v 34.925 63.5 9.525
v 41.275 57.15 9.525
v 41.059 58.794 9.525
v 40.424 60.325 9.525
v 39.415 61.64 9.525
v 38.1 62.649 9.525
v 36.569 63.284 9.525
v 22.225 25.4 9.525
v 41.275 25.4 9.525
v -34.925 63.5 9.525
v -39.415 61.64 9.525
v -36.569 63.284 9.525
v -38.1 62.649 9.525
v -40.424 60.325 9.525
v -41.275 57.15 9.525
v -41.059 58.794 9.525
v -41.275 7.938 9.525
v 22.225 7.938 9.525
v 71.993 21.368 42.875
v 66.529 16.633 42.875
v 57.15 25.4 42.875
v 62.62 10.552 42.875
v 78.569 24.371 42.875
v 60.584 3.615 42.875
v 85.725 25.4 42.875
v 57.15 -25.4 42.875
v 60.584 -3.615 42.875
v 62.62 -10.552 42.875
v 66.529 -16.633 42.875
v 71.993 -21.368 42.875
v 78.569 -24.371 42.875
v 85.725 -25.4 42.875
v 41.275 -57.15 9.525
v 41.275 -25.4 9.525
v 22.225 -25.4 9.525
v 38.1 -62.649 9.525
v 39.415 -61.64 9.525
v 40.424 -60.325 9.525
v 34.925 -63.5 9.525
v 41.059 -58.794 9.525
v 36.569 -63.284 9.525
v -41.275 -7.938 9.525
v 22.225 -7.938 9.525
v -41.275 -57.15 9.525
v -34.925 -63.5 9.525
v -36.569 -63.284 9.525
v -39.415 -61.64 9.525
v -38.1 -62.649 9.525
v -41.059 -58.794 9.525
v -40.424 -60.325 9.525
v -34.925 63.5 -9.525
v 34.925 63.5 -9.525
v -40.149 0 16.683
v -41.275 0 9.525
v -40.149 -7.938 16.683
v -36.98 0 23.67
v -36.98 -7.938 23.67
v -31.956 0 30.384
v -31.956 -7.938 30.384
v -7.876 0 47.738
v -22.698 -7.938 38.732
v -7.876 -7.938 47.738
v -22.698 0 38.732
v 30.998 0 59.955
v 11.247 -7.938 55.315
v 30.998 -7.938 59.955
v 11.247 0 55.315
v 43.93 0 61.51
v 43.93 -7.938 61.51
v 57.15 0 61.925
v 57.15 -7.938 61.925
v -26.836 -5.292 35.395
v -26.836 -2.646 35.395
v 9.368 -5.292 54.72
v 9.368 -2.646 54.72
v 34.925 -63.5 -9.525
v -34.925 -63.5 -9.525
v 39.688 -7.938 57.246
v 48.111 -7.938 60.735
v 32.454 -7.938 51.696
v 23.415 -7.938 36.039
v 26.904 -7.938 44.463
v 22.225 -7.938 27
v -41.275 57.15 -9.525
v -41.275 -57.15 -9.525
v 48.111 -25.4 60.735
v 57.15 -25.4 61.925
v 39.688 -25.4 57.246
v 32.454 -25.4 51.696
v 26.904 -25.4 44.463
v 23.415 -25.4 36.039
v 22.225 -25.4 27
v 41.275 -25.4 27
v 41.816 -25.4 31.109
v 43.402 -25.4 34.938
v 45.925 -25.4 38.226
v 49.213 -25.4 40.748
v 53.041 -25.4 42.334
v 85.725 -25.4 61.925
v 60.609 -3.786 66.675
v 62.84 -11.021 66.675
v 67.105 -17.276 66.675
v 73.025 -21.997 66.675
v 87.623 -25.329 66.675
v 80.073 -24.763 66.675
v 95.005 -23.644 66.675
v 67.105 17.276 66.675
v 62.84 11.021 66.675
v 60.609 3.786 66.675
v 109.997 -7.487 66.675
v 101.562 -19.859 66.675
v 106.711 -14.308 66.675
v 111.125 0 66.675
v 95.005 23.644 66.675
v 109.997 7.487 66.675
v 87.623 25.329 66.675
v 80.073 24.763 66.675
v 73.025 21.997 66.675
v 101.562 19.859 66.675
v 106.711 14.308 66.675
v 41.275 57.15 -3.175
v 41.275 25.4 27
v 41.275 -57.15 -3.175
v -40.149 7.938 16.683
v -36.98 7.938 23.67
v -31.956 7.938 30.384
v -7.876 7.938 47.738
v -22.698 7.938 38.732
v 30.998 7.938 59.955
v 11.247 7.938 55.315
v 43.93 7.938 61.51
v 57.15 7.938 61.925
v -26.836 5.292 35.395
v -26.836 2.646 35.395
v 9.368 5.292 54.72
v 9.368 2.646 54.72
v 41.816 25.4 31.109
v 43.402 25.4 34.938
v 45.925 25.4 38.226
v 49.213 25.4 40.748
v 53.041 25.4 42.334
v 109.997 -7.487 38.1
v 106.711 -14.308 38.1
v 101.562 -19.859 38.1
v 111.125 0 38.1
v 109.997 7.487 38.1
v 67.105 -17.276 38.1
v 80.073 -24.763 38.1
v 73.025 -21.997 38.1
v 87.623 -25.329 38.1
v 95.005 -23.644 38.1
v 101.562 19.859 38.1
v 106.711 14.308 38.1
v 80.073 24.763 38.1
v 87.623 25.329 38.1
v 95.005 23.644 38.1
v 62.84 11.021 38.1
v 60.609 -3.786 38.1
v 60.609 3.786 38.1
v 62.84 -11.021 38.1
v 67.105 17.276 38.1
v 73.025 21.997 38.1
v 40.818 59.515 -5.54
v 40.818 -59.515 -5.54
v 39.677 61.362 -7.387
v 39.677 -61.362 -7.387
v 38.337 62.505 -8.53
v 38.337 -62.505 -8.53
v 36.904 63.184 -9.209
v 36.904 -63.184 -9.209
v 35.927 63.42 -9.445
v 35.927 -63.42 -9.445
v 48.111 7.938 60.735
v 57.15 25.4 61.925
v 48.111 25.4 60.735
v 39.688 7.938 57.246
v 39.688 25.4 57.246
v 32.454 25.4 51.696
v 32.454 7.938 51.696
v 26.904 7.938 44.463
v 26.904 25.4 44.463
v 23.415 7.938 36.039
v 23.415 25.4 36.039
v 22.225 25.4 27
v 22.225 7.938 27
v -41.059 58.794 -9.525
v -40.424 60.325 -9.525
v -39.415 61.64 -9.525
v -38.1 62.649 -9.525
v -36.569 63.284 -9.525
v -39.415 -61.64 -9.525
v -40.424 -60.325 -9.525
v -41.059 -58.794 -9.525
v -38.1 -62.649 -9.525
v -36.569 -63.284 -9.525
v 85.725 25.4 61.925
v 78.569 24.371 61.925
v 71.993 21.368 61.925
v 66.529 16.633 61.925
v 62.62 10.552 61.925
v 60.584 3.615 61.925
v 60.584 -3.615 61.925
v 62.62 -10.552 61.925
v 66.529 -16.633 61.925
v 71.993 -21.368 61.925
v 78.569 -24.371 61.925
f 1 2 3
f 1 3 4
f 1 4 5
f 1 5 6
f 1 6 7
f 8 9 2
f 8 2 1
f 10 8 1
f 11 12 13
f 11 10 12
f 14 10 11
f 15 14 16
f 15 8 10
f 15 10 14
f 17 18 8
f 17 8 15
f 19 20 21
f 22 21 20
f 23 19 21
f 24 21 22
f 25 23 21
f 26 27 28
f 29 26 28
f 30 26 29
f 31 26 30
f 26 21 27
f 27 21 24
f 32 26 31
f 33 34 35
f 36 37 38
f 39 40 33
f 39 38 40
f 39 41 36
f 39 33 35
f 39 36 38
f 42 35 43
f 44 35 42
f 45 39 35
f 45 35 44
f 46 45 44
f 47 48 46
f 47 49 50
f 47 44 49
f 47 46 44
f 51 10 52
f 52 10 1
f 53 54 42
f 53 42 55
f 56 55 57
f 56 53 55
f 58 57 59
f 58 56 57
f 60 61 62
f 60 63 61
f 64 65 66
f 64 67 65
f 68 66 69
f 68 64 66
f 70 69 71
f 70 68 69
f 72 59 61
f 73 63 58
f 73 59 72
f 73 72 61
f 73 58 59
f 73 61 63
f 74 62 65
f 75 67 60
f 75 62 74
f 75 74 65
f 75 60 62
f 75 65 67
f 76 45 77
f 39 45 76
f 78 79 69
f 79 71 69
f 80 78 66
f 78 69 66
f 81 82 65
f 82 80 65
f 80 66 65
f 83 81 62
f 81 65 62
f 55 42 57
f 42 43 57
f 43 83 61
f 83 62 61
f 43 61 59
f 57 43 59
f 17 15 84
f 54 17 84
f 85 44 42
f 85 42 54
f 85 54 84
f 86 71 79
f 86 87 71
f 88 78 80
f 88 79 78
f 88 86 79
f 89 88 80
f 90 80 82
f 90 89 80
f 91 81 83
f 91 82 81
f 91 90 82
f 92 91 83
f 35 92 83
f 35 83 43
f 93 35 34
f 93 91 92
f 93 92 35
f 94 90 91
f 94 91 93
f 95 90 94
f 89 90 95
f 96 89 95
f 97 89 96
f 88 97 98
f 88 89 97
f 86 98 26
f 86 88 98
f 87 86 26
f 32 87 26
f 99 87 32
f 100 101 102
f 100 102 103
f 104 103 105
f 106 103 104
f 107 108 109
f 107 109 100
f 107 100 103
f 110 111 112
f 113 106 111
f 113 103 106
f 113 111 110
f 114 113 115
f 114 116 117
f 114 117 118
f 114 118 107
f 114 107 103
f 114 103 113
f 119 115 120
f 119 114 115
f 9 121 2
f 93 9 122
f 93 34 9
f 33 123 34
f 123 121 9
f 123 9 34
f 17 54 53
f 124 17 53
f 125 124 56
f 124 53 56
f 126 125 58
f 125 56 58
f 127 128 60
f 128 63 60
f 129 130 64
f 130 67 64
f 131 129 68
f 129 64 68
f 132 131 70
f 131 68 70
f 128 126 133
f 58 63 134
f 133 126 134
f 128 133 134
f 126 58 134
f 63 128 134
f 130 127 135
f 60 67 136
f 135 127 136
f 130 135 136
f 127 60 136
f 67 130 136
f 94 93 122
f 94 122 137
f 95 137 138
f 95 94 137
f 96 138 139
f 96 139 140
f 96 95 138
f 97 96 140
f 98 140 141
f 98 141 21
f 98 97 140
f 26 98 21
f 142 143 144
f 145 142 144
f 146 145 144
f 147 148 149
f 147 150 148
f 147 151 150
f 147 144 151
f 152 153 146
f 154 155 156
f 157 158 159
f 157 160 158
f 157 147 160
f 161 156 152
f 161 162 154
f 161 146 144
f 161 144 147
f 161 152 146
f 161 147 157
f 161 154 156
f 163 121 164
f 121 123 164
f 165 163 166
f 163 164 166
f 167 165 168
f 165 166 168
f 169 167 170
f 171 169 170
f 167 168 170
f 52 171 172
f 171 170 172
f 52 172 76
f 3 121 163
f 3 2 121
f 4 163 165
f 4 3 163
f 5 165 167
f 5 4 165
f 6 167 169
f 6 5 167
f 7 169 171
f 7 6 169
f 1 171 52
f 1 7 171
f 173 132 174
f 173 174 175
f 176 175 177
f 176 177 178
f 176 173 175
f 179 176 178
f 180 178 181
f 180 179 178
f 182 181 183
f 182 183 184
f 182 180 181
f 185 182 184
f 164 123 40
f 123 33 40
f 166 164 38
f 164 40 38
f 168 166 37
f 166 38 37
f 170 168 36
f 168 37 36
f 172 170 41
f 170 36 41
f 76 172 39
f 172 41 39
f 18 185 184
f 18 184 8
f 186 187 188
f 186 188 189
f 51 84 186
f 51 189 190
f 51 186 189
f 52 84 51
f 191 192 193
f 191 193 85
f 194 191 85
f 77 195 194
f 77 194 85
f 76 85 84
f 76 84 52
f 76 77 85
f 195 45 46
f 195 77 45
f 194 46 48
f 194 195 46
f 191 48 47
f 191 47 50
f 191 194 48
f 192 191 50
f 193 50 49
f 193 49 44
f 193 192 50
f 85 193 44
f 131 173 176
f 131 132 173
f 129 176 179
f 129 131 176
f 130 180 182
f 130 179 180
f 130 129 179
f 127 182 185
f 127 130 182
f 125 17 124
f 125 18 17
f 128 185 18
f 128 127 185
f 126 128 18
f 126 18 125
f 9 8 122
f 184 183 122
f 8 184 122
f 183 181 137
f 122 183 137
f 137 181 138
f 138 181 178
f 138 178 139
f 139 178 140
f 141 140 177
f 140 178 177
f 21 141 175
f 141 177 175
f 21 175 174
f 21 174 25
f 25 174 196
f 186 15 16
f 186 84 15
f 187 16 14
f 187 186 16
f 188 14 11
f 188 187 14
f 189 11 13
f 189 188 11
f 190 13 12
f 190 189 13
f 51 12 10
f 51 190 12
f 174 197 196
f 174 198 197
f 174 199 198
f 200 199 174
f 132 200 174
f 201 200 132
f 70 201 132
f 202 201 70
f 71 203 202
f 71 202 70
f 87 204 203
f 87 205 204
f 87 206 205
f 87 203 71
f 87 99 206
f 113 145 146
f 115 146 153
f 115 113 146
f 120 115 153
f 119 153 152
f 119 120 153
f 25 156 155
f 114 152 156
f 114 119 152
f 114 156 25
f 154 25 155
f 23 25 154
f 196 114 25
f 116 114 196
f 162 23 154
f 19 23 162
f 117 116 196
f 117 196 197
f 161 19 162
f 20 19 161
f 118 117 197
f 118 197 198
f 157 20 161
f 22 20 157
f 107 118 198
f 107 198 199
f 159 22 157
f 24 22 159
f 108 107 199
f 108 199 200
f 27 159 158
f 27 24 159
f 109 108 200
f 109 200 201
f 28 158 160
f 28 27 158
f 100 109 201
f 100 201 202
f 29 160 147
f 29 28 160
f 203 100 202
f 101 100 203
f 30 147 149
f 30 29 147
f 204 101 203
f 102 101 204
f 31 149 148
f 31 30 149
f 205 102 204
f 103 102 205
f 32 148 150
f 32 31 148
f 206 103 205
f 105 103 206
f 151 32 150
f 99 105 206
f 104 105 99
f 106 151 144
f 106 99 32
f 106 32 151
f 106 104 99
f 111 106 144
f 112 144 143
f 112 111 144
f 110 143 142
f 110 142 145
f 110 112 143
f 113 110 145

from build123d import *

# Parameters (mm, degrees)
F1_DEPTH = 63.5
F0_W     = 25.4
F0_H     = 19.05
F2_DEPTH = 25.4
F3_DEPTH = 7.9375
F5_R     = 6.35


with BuildPart() as f1:
    # F0 (on Front) → F1 (new body, symmetric)
    with BuildSketch(Plane.XZ):
        Polygon((-41.275, 9.525), (-41.275, -9.525), (41.275, -9.525), (41.275, 9.525), (22.225, 9.525), align=None)
    extrude(amount=F1_DEPTH, both=True)

    # F0 (on Front) → F2 (join, symmetric)
    with BuildSketch(Plane.XZ):
        with BuildLine():
            Line((22.225, 9.525), (41.275, 9.525))
            Line((41.275, 9.525), (41.275, 27.0002))
            ThreePointArc((41.275, 27.0002), (45.9246798487, 38.2255201513), (57.15, 42.8752))
            Line((57.15, 42.8752), (60.325, 42.8752))
            Line((60.325, 42.8752), (60.325, 61.9252))
            Line((60.325, 61.9252), (57.15, 61.9252))
            ThreePointArc((57.15, 61.9252), (32.4542956671, 51.6959043329), (22.225, 27.0002))
            Line((22.225, 27.0002), (22.225, 9.525))
        make_face()
        with Locations((73.025, 52.4002)):
            Rectangle(F0_W, F0_H)
    extrude(amount=F2_DEPTH, both=True)

    # F0 (on Front) → F3 (join, symmetric)
    with BuildSketch(Plane.XZ):
        with BuildLine():
            add(Edge.make_bspline(
                [(-41.275, 9.525), (-41.1149449646, 36.8104875088), (6.9761793129, 62.6372024417), (57.15, 61.9252)],
                knots=[0, 0, 0, 0, 111.5045361635, 111.5045361635, 111.5045361635, 111.5045361635], degree=3))
            Line((-41.275, 9.525), (22.225, 9.525))
            Line((22.225, 9.525), (22.225, 27.0002))
            ThreePointArc((22.225, 27.0002), (32.4542956671, 51.6959043329), (57.15, 61.9252))
        make_face()
    extrude(amount=F3_DEPTH, both=True)

    # F0 (on Front) → F4 (revolve)
    with BuildSketch(Plane.XZ):
        Polygon((85.725, 66.675), (85.725, 61.9252), (85.725, 42.8752), (85.725, 38.1), (111.125, 38.1), (111.125, 66.675), align=None)
    revolve(axis=Axis((85.725, 0, 52.3875), (0, 0, 1)))

    # F5
    f5_edges = [f1.edges().sort_by_distance(p)[0] for p in [
        (-41.275, -63.5, 0),
        (41.275, -63.5, 0),
        (41.275, 63.5, 0),
        (41.275, 0, -9.525),
        (-41.275, 63.5, 0),
    ]]
    fillet(f5_edges, radius=F5_R)


solid = f1.part
